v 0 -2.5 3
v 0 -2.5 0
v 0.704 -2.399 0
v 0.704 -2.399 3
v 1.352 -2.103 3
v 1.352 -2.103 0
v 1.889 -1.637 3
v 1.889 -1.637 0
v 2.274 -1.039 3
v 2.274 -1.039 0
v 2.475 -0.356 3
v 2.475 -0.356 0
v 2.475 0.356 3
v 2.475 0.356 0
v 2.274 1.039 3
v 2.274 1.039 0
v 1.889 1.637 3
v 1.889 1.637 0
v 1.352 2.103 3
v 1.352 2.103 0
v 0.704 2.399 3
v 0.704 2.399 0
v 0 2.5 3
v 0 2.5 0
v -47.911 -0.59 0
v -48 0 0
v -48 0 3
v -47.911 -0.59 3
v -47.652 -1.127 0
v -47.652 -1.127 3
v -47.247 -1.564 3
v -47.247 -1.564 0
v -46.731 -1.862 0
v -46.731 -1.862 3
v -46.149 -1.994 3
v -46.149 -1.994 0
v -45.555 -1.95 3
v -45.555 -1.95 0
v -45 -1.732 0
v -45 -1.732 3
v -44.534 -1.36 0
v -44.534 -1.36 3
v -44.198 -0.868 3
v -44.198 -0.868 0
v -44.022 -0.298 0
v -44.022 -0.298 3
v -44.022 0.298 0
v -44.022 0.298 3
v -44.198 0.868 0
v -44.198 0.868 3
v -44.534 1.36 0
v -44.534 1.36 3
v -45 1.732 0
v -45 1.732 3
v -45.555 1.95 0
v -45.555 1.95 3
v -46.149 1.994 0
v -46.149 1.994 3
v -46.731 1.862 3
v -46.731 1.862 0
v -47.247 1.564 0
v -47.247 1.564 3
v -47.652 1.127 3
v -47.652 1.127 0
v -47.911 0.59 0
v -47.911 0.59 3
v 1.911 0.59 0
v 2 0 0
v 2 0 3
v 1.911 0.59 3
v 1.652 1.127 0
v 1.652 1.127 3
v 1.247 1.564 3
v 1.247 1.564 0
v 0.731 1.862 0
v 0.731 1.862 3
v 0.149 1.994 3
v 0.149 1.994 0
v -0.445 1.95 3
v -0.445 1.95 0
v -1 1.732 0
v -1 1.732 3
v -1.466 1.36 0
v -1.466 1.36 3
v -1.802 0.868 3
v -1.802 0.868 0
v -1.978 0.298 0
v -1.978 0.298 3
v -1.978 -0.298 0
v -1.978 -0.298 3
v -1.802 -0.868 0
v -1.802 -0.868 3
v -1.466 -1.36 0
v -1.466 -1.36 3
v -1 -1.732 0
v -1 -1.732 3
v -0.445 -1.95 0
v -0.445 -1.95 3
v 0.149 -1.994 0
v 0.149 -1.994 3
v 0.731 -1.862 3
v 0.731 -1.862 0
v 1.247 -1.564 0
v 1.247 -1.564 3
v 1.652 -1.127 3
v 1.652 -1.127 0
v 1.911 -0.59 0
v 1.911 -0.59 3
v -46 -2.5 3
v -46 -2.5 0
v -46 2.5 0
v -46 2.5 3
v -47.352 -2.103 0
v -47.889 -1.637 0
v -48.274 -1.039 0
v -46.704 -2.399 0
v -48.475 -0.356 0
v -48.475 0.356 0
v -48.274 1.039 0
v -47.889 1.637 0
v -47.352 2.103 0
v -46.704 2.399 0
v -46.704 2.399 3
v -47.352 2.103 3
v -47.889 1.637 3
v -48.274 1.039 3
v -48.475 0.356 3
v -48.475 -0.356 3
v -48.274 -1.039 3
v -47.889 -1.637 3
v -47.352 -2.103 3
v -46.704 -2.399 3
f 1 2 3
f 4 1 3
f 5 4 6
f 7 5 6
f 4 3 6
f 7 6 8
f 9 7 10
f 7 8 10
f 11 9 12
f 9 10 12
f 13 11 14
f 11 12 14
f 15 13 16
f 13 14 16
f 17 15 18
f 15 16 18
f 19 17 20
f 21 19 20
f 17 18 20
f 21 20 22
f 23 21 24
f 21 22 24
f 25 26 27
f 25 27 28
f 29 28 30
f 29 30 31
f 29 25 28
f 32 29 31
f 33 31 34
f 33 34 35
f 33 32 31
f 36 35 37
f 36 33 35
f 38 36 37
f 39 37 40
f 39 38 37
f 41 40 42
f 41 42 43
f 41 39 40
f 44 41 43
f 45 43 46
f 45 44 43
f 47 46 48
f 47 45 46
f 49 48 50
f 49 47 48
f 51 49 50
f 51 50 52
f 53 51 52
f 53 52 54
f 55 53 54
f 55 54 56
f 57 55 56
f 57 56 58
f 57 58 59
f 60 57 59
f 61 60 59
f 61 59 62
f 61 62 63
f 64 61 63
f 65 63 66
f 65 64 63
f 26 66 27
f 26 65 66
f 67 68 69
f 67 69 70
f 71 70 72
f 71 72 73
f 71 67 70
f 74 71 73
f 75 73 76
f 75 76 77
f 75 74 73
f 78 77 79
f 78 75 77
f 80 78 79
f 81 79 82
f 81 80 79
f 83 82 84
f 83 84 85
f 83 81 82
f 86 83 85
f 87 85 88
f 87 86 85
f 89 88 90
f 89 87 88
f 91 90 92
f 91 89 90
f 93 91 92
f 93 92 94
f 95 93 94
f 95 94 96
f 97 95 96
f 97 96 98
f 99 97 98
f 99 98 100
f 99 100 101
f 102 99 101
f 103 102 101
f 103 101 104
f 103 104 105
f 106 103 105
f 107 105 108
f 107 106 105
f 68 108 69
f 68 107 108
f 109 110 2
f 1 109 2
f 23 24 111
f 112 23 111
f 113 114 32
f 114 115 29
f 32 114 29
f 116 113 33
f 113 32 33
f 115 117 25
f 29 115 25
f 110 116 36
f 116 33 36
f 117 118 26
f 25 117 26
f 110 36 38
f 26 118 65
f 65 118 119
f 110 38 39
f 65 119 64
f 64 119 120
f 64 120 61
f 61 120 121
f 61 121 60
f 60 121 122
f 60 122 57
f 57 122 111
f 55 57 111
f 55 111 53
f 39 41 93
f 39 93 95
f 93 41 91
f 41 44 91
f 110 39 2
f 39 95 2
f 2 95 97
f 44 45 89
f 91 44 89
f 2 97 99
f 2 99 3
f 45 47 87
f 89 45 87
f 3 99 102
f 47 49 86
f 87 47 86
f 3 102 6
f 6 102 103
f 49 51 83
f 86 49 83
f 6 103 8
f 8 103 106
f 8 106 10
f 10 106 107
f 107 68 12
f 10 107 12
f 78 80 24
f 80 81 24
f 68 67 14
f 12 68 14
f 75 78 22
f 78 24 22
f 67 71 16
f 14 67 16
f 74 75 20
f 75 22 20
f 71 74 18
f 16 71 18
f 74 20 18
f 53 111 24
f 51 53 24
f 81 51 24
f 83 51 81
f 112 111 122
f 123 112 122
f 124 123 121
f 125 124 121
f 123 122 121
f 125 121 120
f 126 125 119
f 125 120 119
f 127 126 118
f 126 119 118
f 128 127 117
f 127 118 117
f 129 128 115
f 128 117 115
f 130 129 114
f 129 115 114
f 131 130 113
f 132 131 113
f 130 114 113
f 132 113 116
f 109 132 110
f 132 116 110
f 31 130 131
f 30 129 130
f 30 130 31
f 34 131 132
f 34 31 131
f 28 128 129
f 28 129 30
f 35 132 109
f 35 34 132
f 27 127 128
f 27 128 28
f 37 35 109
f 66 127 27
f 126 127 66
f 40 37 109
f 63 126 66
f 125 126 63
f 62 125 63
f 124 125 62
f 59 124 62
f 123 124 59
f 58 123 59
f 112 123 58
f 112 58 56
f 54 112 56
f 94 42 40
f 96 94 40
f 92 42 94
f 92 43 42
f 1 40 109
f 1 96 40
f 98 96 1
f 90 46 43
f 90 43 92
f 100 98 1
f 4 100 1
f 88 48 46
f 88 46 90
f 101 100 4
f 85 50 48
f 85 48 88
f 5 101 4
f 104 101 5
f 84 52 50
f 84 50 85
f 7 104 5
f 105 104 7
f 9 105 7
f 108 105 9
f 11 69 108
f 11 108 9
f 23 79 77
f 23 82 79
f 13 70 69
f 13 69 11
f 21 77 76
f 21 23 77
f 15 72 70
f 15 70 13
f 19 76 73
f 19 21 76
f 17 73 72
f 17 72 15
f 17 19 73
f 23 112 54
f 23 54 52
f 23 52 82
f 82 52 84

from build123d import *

# Parameters (mm, degrees)
SKETCH_1_R      = 2
EXTRUDE_1_DEPTH = 3


with BuildPart() as part:
    # 草图1 → 凸台-拉伸1 (new body)
    with BuildSketch(Plane.XY):
        with BuildLine():
            Line((0, 2.5), (-46, 2.5))
            ThreePointArc((-46, 2.5), (-48.5, 0), (-46, -2.5))
            Line((-46, -2.5), (0, -2.5))
            ThreePointArc((0, -2.5), (2.5, 0), (0, 2.5))
        make_face()
        Circle(SKETCH_1_R, mode=Mode.SUBTRACT)
        with Locations(Location((-46, 0, 0), (0, 0, 180))):
            Circle(SKETCH_1_R, mode=Mode.SUBTRACT)
    extrude(amount=EXTRUDE_1_DEPTH)


solid = part.part
